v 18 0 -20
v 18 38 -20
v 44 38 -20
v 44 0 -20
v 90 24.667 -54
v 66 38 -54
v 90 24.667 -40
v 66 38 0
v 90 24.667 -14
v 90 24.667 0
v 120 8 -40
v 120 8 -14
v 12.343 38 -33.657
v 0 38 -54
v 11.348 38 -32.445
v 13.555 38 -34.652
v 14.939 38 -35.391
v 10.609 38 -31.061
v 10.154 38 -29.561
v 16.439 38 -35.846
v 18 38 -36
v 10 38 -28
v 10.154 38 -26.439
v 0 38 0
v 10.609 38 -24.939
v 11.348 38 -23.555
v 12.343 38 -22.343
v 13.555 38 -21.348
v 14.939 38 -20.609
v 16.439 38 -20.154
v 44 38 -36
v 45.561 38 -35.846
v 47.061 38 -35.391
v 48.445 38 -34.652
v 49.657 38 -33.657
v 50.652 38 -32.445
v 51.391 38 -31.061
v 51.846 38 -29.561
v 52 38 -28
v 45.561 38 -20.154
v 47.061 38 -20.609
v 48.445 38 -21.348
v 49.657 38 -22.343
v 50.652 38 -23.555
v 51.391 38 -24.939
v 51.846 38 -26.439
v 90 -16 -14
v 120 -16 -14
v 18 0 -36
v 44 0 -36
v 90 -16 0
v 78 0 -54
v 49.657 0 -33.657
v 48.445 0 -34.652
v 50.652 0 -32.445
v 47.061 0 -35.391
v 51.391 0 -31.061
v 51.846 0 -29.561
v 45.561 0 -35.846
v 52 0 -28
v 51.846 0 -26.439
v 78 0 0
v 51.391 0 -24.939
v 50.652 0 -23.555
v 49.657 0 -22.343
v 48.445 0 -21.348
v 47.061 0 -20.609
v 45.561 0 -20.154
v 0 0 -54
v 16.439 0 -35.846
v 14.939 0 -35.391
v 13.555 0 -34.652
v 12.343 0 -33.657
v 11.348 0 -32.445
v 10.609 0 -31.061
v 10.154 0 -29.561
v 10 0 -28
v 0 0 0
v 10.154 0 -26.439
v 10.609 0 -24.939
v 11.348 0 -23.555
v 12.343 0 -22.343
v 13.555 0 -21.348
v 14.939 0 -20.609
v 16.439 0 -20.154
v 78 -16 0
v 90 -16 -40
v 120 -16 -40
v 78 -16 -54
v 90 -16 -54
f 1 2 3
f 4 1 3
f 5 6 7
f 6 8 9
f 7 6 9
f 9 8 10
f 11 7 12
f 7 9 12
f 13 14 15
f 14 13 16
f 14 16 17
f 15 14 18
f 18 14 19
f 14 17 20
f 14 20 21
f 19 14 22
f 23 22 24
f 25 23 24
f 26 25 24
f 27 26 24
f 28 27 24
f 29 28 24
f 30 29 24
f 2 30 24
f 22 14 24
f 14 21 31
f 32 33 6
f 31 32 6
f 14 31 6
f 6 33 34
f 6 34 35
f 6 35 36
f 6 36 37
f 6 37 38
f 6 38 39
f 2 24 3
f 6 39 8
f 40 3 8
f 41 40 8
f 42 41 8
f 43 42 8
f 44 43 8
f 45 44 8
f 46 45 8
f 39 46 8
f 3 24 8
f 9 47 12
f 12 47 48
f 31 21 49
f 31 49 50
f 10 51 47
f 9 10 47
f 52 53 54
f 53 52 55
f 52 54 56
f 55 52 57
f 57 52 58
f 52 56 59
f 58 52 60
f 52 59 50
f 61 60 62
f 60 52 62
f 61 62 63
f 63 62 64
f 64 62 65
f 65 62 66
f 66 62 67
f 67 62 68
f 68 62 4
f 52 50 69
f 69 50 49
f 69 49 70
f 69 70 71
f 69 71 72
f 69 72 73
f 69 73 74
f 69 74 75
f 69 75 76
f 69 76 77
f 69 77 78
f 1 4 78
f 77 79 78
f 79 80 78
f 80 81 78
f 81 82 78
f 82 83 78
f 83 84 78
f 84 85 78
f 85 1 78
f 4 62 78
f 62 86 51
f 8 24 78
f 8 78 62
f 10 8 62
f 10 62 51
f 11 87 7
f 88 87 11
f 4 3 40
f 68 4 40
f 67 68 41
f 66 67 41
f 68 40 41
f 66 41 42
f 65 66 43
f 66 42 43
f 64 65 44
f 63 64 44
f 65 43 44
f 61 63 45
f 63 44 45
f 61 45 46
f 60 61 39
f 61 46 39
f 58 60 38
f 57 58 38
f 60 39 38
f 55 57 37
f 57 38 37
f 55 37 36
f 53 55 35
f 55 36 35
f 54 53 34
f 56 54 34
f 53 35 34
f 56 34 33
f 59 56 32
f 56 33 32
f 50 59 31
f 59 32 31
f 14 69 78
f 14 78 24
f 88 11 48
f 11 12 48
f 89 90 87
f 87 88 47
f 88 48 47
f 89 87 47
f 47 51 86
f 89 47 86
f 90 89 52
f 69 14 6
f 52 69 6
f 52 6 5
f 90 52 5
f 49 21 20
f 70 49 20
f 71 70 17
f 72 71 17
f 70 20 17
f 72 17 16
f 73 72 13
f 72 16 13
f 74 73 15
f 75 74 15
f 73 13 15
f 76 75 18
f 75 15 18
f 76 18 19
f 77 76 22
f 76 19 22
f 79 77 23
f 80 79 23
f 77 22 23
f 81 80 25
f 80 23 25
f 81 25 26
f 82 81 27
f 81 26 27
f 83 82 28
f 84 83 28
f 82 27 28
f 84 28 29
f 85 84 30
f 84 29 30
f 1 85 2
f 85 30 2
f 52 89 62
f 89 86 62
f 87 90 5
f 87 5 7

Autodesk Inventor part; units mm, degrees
ref_plane "YZ Plane" through (0, 0, 0) normal (1, 0, 0) x (0, 1, 0)
ref_plane "XZ Plane" through (0, 0, 0) normal (0, 1, 0) x (-1, 0, 0)
ref_plane "XY Plane" through (0, 0, 0) normal (0, 0, 1) x (1, 0, 0)
sketch "草圖1" plane through (0, 0, 0) normal (0, 0, 1) x (1, 0, 0)
  line L0 (0, 0) -> (0, 38)
  line L1 (0, 38) -> (66, 38)
  line L2 (66, 38) -> (120, 8)
  line L3 (120, 8) -> (120, -16)
  line L4 (120, -16) -> (78, -16)
  line L5 (78, -16) -> (78, 0)
  line L6 (78, 0) -> (0, 0)
  dimension "d0" = 54
  dimension "d1" = 38
  dimension "d2" = 24
  dimension "d3" = 42
  dimension "d4" = 66
  dimension "d5" = 120
extrude "擠出1" add sketch "草圖1" against normal blind 54
sketch "草圖2" plane through (0, 38, 0) normal (0, 1, 0) x (1, 0, 0)
  arc A0 (18, 36) -> (18, 20) centre (18, 28) ccw
  line L0 (18, 36) -> (44, 36)
  line L1 (18, 20) -> (44, 20)
  arc A1 (44, 20) -> (44, 36) centre (44, 28) ccw
  line L2 (0, 0) -> (66, 0) projected
  line L3 (0, 0) -> (0, 54) projected
  dimension "d8" = 28
  dimension "d9" = 16
  dimension "d10" = 18
  dimension "d11" = 26
extrude "擠出2" cut sketch "草圖2" against normal up to next
sketch "草圖3" plane through (78, -16, 0) normal (0, -1, 0) x (1, 0, 0)
  line L0 (12, -54) -> (12, -40)
  line L1 (12, -40) -> (42, -40)
  line L2 (42, -40) -> (42, -54)
  line L3 (42, -54) -> (12, -54)
  line L4 (42, 0) -> (42, -54) projected
  line L5 (42, -27) -> (-15.5842, -27)
  line L6 (12, 0) -> (12, -14)
  line L7 (12, -14) -> (42, -14)
  line L8 (42, -14) -> (42, 0)
  line L9 (42, 0) -> (12, 0)
  line L10 (42, -54) -> (42, 0)
  point P0 (-78, 0)
  point P1 (0, 0)
  point P2 (0, -54)
  point P3 (0, 0)
  dimension "d18" = 30
  dimension "d19" = 14
extrude "擠出3" cut sketch "草圖3" against normal up to next
properties part number "410571040-T1"
